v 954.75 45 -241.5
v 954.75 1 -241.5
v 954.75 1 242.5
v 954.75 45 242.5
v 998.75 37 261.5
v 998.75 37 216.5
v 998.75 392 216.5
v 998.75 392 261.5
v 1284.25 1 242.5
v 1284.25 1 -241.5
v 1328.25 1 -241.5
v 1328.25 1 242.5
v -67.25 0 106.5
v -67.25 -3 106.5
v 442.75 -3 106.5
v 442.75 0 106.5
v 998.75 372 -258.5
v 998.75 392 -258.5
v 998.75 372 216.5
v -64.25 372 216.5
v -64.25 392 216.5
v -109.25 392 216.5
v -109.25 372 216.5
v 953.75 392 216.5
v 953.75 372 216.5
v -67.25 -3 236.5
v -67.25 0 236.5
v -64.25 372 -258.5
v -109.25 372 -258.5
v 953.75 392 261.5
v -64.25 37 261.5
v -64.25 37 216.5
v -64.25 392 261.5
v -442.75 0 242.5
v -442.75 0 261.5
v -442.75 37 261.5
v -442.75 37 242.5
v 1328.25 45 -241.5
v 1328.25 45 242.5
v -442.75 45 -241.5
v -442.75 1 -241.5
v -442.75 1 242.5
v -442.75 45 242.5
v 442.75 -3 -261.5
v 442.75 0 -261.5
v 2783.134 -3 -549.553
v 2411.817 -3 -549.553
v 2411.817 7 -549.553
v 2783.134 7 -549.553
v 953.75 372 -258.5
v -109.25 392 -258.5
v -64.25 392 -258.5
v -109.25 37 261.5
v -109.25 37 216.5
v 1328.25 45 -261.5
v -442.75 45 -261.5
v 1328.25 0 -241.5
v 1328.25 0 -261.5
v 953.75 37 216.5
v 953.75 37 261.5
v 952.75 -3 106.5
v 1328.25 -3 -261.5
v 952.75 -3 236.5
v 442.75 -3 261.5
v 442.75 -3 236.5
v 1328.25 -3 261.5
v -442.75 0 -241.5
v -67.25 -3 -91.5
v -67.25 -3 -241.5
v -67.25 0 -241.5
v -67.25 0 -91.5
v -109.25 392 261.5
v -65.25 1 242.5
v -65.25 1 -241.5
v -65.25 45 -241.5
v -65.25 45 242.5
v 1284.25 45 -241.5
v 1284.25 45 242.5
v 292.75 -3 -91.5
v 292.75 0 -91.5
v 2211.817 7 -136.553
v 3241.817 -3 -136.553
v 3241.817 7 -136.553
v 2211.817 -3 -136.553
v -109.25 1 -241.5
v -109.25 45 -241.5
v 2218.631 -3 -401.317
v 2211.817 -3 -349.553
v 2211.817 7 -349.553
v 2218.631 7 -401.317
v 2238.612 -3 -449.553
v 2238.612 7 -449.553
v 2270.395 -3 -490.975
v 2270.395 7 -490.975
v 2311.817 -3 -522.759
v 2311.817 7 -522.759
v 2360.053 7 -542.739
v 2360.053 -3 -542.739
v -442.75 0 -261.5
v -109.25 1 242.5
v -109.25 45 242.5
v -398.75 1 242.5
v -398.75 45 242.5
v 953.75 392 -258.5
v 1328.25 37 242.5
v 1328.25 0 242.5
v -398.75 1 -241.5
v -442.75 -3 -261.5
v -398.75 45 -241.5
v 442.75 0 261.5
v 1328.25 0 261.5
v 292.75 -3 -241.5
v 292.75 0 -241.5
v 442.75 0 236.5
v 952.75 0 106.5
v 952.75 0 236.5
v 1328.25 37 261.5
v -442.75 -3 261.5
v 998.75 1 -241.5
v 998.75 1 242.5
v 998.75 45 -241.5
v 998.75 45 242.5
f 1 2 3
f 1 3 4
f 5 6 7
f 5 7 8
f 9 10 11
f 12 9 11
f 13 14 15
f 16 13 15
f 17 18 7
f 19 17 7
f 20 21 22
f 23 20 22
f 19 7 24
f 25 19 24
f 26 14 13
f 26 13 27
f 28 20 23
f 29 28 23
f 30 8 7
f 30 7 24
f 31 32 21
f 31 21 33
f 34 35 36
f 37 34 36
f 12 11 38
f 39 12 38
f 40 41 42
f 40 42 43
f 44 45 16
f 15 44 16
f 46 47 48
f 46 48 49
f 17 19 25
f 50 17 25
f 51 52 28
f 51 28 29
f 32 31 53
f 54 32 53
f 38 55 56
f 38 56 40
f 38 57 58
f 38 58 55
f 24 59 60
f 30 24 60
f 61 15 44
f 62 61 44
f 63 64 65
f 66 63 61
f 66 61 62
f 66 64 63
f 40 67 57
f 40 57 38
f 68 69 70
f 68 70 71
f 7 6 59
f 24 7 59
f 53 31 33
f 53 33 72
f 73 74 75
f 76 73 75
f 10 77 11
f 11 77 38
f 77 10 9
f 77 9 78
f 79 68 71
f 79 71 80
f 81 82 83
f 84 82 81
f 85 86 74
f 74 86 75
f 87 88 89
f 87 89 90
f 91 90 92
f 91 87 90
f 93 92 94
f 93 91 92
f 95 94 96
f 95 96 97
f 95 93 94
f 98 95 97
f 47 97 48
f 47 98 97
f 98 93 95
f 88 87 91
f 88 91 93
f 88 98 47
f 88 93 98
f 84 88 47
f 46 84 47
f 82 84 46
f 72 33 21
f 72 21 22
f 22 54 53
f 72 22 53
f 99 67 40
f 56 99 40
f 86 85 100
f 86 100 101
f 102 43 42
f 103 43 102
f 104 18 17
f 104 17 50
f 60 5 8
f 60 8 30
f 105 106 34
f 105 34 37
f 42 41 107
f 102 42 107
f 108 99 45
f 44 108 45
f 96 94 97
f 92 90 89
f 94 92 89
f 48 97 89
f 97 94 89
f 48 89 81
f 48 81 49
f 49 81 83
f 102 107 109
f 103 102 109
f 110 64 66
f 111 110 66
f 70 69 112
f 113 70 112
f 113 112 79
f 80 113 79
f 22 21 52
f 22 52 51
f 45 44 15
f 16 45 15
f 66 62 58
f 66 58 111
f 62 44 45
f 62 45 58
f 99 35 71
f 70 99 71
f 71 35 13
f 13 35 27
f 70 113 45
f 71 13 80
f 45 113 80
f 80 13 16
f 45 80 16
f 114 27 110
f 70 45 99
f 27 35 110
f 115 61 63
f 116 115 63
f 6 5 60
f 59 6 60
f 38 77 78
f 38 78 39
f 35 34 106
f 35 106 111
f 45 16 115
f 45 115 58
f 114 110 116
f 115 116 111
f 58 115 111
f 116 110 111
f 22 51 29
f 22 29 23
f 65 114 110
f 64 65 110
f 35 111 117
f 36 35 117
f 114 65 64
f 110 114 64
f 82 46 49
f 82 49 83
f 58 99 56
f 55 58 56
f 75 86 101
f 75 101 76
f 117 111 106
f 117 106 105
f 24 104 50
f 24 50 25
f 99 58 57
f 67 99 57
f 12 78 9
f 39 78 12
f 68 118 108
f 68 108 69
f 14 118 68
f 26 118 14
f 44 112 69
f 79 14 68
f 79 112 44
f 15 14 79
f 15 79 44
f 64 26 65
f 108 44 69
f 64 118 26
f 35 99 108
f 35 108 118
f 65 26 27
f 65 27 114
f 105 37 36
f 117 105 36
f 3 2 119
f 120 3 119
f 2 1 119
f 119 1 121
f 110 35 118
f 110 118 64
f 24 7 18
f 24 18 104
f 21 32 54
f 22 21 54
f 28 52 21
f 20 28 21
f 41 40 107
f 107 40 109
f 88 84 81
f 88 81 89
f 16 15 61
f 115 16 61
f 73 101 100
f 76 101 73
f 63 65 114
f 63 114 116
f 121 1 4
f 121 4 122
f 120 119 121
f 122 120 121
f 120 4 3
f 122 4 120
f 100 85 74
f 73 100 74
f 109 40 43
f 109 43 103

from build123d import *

# Parameters (mm, degrees)
F0_W      = 885.5
F0_H      = 523
F1_DEPTH  = 3
F2_W      = 885.5
F2_H      = 523
F3_DEPTH  = 3
F4_W      = 1020
F4_H      = 130
F5_DEPTH  = 25
F6_W      = 360
F6_H      = 150
F7_DEPTH  = 25
F8_W      = 37
F8_H      = 19
F8_W_2    = 45
F8_H_2    = 20
F9_DEPTH  = 1771
F10_W     = 44
F10_H     = 44
F11_DEPTH = 484
F12_W     = 45
F12_H     = 45
F13_DEPTH = 355
F14_W     = 45
F14_H     = 475
F15_DEPTH = 20
F17_DEPTH = 10


with BuildPart() as f1:
    # F0 (on Front) → F1 (new body)
    with BuildSketch(Plane.XZ):
        Rectangle(F0_W, F0_H)
    extrude(amount=F1_DEPTH)


with BuildPart() as f3:
    # F2 (on face) → F3 (new body)
    with BuildSketch(Plane.XZ.offset(3)):
        with Locations((885.5, 0)):
            Rectangle(F2_W, F2_H)
    extrude(amount=-F3_DEPTH)


with BuildPart() as f5_tool:
    # F4 (on face) → F5 (new body)
    with BuildSketch(Plane.XZ.offset(3)):
        with Locations((442.75, 171.5)):
            Rectangle(F4_W, F4_H)
    extrude(amount=-F5_DEPTH)


with BuildPart() as f1_1:
    add(f1.part)

    # F5: cut by f5_tool
    add(f5_tool.part, mode=Mode.SUBTRACT)

    # F6 (on face) → F7 (cut)
    with BuildSketch(Plane.XZ.offset(3)):
        with Locations((112.75, -166.5)):
            Rectangle(F6_W, F6_H)
    extrude(amount=-F7_DEPTH, mode=Mode.SUBTRACT)


with BuildPart() as f3_1:
    add(f3.part)

    # F5: cut by f5_tool
    add(f5_tool.part, mode=Mode.SUBTRACT)


with BuildPart() as f9:
    # F8 (on face) → F9 (new body)
    with BuildSketch(Plane.YZ.offset(1328.25)):
        with Locations((18.5, 252)):
            Rectangle(F8_W, F8_H)
        with Locations((22.5, -251.5)):
            Rectangle(F8_W_2, F8_H_2)
    extrude(amount=-F9_DEPTH)


with BuildPart() as f11:
    # F10 (on face) → F11 (new body)
    with BuildSketch(Plane.XY.offset(-241.5)):
        with Locations((-420.75, 23)):
            Rectangle(F10_W, F10_H)
        with Locations((-87.25, 23)):
            Rectangle(F10_W, F10_H)
        with Locations((976.75, 23)):
            Rectangle(F10_W, F10_H)
        with Locations((1306.25, 23)):
            Rectangle(F10_W, F10_H)
    extrude(amount=F11_DEPTH)


with BuildPart() as f13:
    # F12 (on face) → F13 (new body)
    with BuildSketch(Plane(origin=(0, 37, 0), x_dir=(-1, 0, 0), z_dir=(0, 1, 0))):
        with Locations((-976.25, 239)):
            Rectangle(F12_W, F12_H)
        with Locations((86.75, 239)):
            Rectangle(F12_W, F12_H)
    extrude(amount=F13_DEPTH)


with BuildPart() as f15:
    # F14 (on face) → F15 (new body)
    with BuildSketch(Plane(origin=(0, 392, 0), x_dir=(-1, 0, 0), z_dir=(0, 1, 0))):
        with Locations((-976.25, -21)):
            Rectangle(F14_W, F14_H)
        with Locations((86.75, -21)):
            Rectangle(F14_W, F14_H)
    extrude(amount=-F15_DEPTH)


with BuildPart() as f17:
    # F16 (on face) → F17 (new body)
    with BuildSketch(Plane.XZ.offset(3)):
        with BuildLine():
            ThreePointArc((2211.816654, -349.55343), (2270.395298, -490.974787), (2411.816654, -549.55343))
            Line((2411.816654, -549.55343), (2783.133686, -549.55343))
            Line((2783.133686, -549.55343), (3241.816654, -136.55343))
            Line((3241.816654, -136.55343), (2211.816654, -136.55343))
            Line((2211.816654, -136.55343), (2211.816654, -349.55343))
        make_face()
    extrude(amount=-F17_DEPTH)


solid = Compound([f1_1.part, f3_1.part, f9.part, f11.part, f13.part, f15.part, f17.part])
